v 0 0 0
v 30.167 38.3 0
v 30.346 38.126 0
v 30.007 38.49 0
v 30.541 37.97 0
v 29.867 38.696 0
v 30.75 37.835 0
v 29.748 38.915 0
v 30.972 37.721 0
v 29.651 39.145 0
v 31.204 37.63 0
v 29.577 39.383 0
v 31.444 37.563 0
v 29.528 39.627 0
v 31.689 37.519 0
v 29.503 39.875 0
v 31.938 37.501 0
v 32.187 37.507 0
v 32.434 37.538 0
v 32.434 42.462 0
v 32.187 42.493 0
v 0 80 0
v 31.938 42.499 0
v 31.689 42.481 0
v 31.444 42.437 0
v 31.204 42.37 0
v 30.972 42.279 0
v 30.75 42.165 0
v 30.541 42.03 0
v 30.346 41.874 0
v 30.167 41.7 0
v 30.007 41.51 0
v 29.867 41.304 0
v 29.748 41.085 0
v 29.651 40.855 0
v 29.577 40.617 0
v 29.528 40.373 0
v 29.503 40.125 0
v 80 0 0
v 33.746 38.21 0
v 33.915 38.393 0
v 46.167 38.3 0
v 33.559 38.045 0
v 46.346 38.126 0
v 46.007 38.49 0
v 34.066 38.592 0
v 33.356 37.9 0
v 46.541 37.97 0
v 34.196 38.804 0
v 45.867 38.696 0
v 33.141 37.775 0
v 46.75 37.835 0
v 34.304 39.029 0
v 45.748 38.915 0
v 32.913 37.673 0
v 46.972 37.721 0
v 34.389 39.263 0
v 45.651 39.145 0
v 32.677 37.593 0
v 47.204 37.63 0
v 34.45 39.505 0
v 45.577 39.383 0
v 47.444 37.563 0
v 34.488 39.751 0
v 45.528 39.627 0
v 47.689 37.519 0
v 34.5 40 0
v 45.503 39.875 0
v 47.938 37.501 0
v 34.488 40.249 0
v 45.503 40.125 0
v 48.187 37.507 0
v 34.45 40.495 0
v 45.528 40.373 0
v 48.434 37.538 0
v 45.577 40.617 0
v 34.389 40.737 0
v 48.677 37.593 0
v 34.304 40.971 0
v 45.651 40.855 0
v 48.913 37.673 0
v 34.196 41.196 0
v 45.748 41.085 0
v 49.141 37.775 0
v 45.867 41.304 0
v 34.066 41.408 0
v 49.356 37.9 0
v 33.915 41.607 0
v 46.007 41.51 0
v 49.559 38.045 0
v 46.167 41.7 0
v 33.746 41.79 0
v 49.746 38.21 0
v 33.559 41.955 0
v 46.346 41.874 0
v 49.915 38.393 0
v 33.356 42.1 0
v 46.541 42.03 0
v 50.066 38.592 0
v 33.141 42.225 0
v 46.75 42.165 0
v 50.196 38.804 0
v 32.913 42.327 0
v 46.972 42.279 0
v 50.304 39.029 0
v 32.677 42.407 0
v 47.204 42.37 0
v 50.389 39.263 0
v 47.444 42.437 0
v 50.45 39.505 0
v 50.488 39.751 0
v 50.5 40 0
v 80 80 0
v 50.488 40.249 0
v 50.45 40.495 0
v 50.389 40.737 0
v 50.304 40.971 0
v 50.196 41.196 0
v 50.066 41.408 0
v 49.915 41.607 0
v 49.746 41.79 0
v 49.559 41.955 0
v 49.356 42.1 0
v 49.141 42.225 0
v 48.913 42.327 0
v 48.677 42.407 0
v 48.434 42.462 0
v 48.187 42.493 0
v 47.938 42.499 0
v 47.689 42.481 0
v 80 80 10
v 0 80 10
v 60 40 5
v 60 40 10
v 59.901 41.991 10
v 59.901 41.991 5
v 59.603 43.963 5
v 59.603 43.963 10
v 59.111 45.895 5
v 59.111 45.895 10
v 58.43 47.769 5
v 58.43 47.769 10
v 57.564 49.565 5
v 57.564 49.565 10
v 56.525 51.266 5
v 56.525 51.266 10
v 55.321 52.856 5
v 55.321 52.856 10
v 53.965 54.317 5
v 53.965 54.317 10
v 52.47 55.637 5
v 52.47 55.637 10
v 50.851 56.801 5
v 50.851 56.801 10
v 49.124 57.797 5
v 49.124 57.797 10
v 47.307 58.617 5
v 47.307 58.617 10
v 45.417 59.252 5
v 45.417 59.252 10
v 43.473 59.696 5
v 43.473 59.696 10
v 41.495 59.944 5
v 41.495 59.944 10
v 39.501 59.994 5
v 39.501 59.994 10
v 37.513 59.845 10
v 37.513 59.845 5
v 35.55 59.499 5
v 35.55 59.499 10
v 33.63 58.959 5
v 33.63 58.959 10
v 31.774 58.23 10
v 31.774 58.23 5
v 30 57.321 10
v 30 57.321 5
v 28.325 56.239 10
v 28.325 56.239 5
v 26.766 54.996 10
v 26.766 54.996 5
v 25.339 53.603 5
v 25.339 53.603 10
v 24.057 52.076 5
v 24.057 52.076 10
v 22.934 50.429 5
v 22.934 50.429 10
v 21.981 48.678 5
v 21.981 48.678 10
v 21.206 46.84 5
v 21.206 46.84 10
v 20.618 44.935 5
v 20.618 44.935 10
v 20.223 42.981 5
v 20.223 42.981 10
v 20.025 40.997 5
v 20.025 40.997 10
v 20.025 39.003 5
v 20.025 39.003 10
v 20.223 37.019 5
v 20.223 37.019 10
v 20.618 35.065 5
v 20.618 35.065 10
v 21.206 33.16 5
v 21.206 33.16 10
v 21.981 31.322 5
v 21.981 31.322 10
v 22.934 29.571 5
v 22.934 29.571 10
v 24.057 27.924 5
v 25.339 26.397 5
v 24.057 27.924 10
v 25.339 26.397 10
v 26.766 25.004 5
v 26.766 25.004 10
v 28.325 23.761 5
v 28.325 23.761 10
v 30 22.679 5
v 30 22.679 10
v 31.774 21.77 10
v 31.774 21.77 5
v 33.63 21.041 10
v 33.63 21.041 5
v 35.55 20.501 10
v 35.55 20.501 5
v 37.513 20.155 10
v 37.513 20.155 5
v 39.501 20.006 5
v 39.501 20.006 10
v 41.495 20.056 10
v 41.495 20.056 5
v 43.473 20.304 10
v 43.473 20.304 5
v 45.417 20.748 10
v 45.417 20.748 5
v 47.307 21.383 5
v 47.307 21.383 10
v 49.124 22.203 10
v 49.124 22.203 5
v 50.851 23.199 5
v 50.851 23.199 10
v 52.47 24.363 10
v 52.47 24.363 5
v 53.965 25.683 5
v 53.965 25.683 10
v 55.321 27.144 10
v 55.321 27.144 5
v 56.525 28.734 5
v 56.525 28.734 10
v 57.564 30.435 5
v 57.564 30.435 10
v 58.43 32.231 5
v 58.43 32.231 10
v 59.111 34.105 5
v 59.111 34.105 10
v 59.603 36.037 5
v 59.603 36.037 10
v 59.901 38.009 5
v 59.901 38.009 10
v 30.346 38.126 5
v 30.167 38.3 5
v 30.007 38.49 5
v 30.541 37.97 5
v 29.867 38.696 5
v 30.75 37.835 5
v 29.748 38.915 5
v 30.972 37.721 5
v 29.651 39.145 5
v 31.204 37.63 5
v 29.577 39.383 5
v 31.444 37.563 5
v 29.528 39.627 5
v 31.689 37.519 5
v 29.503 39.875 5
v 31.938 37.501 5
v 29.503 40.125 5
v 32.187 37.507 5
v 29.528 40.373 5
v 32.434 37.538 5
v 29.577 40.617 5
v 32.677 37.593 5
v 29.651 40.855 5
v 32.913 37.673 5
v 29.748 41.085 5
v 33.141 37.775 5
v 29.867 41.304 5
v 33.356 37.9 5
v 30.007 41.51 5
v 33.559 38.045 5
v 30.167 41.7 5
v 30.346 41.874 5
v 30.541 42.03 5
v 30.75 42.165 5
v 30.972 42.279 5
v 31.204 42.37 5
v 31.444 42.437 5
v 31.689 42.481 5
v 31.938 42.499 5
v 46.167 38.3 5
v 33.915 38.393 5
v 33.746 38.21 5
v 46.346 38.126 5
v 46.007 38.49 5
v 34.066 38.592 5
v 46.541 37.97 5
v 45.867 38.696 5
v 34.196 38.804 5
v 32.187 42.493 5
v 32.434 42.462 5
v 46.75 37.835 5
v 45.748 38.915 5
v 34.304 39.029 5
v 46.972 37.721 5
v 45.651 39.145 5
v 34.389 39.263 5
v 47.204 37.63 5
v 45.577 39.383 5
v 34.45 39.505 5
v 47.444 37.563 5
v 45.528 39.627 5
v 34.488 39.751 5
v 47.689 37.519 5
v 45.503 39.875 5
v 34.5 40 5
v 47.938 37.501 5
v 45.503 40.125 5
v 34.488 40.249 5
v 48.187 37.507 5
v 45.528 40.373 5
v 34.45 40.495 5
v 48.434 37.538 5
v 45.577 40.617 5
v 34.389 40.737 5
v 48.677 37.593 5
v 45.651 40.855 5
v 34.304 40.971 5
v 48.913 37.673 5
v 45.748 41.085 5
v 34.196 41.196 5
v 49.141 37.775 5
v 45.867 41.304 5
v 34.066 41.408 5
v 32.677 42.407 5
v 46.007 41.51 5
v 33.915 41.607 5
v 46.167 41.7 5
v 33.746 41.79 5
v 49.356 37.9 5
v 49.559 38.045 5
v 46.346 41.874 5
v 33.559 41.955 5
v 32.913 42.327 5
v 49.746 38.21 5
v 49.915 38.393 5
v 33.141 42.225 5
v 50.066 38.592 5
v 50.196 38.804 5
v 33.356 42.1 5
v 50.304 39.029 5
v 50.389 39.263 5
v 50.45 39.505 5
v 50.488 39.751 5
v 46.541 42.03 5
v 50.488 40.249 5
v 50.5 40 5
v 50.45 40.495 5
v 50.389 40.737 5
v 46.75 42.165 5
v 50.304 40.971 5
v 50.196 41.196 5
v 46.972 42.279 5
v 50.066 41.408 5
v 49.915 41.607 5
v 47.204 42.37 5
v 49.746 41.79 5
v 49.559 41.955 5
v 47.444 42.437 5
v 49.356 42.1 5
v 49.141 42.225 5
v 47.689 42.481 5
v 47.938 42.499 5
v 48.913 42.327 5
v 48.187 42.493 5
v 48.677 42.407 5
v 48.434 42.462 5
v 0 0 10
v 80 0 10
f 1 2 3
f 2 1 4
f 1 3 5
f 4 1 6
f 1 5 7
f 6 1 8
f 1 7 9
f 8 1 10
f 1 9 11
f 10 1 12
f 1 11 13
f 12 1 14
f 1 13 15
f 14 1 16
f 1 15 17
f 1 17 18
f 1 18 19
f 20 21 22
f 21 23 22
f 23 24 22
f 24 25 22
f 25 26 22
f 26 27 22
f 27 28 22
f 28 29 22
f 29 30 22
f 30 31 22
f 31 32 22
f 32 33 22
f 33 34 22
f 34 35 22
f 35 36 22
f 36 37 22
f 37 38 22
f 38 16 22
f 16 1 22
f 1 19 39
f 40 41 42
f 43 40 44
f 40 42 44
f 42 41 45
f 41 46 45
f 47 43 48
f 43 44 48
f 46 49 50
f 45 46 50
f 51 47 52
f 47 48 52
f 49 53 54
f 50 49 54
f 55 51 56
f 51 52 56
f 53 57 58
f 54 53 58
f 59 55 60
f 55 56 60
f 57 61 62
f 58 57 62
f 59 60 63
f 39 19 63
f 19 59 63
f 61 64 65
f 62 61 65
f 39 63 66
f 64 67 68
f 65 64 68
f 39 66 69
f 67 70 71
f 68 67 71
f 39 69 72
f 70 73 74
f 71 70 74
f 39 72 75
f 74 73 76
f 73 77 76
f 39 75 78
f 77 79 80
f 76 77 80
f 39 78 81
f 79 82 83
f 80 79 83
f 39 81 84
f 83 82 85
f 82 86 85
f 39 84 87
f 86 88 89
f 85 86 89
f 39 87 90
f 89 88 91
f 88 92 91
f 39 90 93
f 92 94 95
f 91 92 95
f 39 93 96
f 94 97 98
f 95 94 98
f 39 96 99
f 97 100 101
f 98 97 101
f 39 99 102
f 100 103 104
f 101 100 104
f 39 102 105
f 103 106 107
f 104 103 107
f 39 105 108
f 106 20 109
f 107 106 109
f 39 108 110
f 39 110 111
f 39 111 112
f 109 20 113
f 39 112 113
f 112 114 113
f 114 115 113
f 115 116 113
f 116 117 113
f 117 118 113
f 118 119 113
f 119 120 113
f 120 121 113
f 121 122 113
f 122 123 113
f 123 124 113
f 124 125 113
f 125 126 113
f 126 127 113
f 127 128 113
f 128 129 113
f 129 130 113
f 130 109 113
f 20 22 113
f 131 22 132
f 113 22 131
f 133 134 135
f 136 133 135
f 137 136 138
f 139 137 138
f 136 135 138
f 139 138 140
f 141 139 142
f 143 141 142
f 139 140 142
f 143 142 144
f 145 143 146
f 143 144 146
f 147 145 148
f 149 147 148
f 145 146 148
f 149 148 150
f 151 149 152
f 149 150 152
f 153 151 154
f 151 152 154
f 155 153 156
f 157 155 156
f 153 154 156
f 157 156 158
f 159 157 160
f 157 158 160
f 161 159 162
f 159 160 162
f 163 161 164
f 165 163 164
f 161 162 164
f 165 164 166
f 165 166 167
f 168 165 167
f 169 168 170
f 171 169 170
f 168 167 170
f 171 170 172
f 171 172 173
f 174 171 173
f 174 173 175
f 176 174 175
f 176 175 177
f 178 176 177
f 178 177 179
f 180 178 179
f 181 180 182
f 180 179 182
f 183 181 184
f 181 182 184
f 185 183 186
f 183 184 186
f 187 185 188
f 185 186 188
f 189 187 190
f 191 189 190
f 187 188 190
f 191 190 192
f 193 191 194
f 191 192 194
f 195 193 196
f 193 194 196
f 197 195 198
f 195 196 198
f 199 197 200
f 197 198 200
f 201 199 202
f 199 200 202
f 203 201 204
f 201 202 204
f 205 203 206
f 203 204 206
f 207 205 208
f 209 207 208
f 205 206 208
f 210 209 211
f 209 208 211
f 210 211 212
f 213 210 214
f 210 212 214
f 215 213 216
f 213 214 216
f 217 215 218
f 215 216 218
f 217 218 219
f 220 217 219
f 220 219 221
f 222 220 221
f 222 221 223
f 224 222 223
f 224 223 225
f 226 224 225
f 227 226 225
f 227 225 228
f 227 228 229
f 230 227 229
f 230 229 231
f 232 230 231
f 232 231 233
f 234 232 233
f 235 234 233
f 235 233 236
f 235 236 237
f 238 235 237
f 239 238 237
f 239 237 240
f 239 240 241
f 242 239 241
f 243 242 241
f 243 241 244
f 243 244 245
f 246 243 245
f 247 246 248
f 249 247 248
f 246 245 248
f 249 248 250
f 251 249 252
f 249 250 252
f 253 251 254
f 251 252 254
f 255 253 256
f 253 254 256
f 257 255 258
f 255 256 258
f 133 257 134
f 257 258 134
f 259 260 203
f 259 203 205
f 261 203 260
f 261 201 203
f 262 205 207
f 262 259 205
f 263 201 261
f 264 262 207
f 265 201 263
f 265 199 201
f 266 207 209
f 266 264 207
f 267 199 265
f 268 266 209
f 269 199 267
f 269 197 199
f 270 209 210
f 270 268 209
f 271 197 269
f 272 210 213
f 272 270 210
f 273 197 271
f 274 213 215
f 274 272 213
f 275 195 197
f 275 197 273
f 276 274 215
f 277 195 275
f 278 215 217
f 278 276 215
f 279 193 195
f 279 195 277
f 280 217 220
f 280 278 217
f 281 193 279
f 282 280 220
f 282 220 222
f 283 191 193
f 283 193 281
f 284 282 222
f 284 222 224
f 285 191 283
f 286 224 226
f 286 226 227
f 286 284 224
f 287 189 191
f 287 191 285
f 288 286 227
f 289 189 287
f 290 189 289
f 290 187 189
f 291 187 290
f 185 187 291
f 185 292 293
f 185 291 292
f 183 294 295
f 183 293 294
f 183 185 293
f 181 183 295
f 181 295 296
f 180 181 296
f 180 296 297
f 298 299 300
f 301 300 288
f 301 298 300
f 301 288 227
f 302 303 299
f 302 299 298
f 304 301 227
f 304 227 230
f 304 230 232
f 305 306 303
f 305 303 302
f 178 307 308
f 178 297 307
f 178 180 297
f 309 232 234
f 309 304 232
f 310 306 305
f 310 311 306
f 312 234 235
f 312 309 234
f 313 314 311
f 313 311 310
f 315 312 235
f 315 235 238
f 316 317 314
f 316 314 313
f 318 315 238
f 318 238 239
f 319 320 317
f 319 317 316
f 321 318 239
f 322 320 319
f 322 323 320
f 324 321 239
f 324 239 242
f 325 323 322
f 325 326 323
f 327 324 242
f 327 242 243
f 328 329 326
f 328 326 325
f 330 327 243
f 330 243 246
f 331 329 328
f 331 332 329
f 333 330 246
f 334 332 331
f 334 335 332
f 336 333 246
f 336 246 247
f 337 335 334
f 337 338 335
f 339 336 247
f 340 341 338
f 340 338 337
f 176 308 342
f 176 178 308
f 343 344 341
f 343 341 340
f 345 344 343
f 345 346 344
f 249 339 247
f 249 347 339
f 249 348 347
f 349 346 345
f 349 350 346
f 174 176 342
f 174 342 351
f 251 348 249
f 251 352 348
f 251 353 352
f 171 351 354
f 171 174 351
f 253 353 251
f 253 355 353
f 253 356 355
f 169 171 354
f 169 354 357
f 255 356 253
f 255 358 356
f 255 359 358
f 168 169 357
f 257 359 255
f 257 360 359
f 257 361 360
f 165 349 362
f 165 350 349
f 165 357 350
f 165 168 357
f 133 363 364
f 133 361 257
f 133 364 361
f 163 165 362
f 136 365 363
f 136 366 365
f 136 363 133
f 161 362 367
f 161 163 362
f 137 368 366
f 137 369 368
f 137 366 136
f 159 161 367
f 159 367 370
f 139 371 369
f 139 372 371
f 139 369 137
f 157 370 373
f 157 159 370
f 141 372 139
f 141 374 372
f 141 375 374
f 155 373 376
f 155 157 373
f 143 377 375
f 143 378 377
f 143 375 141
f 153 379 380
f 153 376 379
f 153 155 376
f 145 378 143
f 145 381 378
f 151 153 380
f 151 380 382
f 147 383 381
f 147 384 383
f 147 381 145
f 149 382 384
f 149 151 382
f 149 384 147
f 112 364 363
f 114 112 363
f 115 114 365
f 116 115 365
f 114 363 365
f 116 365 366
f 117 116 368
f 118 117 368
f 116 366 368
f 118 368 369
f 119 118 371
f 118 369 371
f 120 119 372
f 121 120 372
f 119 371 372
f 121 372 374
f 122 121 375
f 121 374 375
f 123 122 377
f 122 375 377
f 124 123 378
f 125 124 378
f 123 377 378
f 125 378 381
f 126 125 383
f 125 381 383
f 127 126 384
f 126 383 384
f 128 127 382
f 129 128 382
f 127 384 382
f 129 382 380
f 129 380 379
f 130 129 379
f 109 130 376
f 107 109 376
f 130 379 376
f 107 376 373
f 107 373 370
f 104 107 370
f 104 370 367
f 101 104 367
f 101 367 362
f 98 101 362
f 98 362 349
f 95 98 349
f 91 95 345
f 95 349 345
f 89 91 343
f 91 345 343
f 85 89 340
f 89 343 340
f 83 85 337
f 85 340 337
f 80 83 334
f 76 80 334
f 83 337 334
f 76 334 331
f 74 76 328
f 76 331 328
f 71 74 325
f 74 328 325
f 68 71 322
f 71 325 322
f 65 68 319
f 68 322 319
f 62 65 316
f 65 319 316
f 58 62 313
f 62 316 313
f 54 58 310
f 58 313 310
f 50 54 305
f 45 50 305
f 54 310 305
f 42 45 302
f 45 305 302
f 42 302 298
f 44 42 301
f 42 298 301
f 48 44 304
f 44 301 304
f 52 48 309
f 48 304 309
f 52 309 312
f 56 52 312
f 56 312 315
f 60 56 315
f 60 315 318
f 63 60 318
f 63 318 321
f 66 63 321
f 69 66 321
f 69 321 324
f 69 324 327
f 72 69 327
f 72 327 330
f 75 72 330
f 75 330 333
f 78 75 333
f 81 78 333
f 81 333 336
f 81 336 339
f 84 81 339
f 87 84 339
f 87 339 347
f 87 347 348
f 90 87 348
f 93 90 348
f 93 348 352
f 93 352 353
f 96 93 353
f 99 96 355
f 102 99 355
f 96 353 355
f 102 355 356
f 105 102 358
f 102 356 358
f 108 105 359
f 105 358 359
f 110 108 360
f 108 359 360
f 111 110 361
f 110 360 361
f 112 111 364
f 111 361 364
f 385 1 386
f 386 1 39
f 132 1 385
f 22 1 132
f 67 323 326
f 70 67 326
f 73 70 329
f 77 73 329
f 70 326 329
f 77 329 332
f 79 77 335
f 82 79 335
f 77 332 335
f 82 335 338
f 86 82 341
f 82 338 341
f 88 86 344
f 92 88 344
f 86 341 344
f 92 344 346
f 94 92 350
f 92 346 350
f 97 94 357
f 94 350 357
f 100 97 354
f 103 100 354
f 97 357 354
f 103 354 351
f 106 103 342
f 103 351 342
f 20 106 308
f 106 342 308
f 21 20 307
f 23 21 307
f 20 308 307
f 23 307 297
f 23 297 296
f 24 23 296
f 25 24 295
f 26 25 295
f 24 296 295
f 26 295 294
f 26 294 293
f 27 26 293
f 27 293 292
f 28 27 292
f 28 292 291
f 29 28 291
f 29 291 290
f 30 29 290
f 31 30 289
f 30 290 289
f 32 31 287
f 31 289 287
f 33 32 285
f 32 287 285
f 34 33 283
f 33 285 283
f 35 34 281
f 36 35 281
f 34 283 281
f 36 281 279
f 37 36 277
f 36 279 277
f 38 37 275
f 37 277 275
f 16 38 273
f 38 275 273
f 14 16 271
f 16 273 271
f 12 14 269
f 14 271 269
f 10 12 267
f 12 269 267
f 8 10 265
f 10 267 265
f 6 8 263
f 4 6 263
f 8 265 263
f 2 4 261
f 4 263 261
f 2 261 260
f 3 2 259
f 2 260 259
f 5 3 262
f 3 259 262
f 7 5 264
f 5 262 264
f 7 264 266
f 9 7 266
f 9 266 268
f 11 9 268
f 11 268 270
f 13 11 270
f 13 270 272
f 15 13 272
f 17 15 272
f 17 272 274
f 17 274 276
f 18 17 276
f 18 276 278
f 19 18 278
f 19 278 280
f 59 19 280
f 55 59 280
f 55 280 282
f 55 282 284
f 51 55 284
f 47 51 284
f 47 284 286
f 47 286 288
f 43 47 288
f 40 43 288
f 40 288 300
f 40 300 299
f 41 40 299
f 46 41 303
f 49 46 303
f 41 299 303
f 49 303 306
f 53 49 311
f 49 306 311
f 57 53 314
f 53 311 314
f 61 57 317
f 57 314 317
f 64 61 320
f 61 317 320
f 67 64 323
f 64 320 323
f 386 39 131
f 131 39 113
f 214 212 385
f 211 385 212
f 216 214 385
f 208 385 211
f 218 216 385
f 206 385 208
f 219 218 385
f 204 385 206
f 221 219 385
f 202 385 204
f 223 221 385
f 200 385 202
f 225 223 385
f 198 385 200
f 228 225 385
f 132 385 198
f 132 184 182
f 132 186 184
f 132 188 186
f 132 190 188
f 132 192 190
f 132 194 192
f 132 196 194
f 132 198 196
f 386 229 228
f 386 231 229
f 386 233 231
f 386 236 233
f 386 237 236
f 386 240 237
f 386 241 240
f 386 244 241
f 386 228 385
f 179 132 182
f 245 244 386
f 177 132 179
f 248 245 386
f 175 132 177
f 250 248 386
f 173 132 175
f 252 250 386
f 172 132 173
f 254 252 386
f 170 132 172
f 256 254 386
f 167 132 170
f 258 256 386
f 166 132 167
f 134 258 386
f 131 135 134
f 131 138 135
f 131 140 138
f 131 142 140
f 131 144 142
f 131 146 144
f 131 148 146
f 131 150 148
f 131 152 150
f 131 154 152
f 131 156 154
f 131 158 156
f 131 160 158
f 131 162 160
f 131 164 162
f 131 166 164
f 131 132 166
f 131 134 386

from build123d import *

# Parameters (mm, degrees)
SKETCH_1_W          = 80
SKETCH_1_H          = 80
EXTRUDE_1_DEPTH     = 10
SKETCH_2_R          = 20
CUT_EXTRUDE_1_DEPTH = 5
SKETCH_3_R          = 2.5
CUT_EXTRUDE_2_DEPTH = 5


with BuildPart() as part:
    # Эскиз1 → Бобышка-Вытянуть1 (new body)
    with BuildSketch(Plane.XY):
        with Locations((40, 40)):
            Rectangle(SKETCH_1_W, SKETCH_1_H)
    extrude(amount=EXTRUDE_1_DEPTH)

    # Эскиз2 → Вырез-Вытянуть1 (cut)
    with BuildSketch(Plane.XY.offset(10)):
        with Locations((40, 40)):
            Circle(SKETCH_2_R)
    extrude(amount=-CUT_EXTRUDE_1_DEPTH, mode=Mode.SUBTRACT)

    # Эскиз3 → Вырез-Вытянуть2 (cut)
    with BuildSketch(Plane.XY.offset(5)):
        with Locations((32, 40)):
            Circle(SKETCH_3_R)
        with Locations((48, 40)):
            Circle(SKETCH_3_R)
    extrude(amount=-CUT_EXTRUDE_2_DEPTH, mode=Mode.SUBTRACT)


solid = part.part
